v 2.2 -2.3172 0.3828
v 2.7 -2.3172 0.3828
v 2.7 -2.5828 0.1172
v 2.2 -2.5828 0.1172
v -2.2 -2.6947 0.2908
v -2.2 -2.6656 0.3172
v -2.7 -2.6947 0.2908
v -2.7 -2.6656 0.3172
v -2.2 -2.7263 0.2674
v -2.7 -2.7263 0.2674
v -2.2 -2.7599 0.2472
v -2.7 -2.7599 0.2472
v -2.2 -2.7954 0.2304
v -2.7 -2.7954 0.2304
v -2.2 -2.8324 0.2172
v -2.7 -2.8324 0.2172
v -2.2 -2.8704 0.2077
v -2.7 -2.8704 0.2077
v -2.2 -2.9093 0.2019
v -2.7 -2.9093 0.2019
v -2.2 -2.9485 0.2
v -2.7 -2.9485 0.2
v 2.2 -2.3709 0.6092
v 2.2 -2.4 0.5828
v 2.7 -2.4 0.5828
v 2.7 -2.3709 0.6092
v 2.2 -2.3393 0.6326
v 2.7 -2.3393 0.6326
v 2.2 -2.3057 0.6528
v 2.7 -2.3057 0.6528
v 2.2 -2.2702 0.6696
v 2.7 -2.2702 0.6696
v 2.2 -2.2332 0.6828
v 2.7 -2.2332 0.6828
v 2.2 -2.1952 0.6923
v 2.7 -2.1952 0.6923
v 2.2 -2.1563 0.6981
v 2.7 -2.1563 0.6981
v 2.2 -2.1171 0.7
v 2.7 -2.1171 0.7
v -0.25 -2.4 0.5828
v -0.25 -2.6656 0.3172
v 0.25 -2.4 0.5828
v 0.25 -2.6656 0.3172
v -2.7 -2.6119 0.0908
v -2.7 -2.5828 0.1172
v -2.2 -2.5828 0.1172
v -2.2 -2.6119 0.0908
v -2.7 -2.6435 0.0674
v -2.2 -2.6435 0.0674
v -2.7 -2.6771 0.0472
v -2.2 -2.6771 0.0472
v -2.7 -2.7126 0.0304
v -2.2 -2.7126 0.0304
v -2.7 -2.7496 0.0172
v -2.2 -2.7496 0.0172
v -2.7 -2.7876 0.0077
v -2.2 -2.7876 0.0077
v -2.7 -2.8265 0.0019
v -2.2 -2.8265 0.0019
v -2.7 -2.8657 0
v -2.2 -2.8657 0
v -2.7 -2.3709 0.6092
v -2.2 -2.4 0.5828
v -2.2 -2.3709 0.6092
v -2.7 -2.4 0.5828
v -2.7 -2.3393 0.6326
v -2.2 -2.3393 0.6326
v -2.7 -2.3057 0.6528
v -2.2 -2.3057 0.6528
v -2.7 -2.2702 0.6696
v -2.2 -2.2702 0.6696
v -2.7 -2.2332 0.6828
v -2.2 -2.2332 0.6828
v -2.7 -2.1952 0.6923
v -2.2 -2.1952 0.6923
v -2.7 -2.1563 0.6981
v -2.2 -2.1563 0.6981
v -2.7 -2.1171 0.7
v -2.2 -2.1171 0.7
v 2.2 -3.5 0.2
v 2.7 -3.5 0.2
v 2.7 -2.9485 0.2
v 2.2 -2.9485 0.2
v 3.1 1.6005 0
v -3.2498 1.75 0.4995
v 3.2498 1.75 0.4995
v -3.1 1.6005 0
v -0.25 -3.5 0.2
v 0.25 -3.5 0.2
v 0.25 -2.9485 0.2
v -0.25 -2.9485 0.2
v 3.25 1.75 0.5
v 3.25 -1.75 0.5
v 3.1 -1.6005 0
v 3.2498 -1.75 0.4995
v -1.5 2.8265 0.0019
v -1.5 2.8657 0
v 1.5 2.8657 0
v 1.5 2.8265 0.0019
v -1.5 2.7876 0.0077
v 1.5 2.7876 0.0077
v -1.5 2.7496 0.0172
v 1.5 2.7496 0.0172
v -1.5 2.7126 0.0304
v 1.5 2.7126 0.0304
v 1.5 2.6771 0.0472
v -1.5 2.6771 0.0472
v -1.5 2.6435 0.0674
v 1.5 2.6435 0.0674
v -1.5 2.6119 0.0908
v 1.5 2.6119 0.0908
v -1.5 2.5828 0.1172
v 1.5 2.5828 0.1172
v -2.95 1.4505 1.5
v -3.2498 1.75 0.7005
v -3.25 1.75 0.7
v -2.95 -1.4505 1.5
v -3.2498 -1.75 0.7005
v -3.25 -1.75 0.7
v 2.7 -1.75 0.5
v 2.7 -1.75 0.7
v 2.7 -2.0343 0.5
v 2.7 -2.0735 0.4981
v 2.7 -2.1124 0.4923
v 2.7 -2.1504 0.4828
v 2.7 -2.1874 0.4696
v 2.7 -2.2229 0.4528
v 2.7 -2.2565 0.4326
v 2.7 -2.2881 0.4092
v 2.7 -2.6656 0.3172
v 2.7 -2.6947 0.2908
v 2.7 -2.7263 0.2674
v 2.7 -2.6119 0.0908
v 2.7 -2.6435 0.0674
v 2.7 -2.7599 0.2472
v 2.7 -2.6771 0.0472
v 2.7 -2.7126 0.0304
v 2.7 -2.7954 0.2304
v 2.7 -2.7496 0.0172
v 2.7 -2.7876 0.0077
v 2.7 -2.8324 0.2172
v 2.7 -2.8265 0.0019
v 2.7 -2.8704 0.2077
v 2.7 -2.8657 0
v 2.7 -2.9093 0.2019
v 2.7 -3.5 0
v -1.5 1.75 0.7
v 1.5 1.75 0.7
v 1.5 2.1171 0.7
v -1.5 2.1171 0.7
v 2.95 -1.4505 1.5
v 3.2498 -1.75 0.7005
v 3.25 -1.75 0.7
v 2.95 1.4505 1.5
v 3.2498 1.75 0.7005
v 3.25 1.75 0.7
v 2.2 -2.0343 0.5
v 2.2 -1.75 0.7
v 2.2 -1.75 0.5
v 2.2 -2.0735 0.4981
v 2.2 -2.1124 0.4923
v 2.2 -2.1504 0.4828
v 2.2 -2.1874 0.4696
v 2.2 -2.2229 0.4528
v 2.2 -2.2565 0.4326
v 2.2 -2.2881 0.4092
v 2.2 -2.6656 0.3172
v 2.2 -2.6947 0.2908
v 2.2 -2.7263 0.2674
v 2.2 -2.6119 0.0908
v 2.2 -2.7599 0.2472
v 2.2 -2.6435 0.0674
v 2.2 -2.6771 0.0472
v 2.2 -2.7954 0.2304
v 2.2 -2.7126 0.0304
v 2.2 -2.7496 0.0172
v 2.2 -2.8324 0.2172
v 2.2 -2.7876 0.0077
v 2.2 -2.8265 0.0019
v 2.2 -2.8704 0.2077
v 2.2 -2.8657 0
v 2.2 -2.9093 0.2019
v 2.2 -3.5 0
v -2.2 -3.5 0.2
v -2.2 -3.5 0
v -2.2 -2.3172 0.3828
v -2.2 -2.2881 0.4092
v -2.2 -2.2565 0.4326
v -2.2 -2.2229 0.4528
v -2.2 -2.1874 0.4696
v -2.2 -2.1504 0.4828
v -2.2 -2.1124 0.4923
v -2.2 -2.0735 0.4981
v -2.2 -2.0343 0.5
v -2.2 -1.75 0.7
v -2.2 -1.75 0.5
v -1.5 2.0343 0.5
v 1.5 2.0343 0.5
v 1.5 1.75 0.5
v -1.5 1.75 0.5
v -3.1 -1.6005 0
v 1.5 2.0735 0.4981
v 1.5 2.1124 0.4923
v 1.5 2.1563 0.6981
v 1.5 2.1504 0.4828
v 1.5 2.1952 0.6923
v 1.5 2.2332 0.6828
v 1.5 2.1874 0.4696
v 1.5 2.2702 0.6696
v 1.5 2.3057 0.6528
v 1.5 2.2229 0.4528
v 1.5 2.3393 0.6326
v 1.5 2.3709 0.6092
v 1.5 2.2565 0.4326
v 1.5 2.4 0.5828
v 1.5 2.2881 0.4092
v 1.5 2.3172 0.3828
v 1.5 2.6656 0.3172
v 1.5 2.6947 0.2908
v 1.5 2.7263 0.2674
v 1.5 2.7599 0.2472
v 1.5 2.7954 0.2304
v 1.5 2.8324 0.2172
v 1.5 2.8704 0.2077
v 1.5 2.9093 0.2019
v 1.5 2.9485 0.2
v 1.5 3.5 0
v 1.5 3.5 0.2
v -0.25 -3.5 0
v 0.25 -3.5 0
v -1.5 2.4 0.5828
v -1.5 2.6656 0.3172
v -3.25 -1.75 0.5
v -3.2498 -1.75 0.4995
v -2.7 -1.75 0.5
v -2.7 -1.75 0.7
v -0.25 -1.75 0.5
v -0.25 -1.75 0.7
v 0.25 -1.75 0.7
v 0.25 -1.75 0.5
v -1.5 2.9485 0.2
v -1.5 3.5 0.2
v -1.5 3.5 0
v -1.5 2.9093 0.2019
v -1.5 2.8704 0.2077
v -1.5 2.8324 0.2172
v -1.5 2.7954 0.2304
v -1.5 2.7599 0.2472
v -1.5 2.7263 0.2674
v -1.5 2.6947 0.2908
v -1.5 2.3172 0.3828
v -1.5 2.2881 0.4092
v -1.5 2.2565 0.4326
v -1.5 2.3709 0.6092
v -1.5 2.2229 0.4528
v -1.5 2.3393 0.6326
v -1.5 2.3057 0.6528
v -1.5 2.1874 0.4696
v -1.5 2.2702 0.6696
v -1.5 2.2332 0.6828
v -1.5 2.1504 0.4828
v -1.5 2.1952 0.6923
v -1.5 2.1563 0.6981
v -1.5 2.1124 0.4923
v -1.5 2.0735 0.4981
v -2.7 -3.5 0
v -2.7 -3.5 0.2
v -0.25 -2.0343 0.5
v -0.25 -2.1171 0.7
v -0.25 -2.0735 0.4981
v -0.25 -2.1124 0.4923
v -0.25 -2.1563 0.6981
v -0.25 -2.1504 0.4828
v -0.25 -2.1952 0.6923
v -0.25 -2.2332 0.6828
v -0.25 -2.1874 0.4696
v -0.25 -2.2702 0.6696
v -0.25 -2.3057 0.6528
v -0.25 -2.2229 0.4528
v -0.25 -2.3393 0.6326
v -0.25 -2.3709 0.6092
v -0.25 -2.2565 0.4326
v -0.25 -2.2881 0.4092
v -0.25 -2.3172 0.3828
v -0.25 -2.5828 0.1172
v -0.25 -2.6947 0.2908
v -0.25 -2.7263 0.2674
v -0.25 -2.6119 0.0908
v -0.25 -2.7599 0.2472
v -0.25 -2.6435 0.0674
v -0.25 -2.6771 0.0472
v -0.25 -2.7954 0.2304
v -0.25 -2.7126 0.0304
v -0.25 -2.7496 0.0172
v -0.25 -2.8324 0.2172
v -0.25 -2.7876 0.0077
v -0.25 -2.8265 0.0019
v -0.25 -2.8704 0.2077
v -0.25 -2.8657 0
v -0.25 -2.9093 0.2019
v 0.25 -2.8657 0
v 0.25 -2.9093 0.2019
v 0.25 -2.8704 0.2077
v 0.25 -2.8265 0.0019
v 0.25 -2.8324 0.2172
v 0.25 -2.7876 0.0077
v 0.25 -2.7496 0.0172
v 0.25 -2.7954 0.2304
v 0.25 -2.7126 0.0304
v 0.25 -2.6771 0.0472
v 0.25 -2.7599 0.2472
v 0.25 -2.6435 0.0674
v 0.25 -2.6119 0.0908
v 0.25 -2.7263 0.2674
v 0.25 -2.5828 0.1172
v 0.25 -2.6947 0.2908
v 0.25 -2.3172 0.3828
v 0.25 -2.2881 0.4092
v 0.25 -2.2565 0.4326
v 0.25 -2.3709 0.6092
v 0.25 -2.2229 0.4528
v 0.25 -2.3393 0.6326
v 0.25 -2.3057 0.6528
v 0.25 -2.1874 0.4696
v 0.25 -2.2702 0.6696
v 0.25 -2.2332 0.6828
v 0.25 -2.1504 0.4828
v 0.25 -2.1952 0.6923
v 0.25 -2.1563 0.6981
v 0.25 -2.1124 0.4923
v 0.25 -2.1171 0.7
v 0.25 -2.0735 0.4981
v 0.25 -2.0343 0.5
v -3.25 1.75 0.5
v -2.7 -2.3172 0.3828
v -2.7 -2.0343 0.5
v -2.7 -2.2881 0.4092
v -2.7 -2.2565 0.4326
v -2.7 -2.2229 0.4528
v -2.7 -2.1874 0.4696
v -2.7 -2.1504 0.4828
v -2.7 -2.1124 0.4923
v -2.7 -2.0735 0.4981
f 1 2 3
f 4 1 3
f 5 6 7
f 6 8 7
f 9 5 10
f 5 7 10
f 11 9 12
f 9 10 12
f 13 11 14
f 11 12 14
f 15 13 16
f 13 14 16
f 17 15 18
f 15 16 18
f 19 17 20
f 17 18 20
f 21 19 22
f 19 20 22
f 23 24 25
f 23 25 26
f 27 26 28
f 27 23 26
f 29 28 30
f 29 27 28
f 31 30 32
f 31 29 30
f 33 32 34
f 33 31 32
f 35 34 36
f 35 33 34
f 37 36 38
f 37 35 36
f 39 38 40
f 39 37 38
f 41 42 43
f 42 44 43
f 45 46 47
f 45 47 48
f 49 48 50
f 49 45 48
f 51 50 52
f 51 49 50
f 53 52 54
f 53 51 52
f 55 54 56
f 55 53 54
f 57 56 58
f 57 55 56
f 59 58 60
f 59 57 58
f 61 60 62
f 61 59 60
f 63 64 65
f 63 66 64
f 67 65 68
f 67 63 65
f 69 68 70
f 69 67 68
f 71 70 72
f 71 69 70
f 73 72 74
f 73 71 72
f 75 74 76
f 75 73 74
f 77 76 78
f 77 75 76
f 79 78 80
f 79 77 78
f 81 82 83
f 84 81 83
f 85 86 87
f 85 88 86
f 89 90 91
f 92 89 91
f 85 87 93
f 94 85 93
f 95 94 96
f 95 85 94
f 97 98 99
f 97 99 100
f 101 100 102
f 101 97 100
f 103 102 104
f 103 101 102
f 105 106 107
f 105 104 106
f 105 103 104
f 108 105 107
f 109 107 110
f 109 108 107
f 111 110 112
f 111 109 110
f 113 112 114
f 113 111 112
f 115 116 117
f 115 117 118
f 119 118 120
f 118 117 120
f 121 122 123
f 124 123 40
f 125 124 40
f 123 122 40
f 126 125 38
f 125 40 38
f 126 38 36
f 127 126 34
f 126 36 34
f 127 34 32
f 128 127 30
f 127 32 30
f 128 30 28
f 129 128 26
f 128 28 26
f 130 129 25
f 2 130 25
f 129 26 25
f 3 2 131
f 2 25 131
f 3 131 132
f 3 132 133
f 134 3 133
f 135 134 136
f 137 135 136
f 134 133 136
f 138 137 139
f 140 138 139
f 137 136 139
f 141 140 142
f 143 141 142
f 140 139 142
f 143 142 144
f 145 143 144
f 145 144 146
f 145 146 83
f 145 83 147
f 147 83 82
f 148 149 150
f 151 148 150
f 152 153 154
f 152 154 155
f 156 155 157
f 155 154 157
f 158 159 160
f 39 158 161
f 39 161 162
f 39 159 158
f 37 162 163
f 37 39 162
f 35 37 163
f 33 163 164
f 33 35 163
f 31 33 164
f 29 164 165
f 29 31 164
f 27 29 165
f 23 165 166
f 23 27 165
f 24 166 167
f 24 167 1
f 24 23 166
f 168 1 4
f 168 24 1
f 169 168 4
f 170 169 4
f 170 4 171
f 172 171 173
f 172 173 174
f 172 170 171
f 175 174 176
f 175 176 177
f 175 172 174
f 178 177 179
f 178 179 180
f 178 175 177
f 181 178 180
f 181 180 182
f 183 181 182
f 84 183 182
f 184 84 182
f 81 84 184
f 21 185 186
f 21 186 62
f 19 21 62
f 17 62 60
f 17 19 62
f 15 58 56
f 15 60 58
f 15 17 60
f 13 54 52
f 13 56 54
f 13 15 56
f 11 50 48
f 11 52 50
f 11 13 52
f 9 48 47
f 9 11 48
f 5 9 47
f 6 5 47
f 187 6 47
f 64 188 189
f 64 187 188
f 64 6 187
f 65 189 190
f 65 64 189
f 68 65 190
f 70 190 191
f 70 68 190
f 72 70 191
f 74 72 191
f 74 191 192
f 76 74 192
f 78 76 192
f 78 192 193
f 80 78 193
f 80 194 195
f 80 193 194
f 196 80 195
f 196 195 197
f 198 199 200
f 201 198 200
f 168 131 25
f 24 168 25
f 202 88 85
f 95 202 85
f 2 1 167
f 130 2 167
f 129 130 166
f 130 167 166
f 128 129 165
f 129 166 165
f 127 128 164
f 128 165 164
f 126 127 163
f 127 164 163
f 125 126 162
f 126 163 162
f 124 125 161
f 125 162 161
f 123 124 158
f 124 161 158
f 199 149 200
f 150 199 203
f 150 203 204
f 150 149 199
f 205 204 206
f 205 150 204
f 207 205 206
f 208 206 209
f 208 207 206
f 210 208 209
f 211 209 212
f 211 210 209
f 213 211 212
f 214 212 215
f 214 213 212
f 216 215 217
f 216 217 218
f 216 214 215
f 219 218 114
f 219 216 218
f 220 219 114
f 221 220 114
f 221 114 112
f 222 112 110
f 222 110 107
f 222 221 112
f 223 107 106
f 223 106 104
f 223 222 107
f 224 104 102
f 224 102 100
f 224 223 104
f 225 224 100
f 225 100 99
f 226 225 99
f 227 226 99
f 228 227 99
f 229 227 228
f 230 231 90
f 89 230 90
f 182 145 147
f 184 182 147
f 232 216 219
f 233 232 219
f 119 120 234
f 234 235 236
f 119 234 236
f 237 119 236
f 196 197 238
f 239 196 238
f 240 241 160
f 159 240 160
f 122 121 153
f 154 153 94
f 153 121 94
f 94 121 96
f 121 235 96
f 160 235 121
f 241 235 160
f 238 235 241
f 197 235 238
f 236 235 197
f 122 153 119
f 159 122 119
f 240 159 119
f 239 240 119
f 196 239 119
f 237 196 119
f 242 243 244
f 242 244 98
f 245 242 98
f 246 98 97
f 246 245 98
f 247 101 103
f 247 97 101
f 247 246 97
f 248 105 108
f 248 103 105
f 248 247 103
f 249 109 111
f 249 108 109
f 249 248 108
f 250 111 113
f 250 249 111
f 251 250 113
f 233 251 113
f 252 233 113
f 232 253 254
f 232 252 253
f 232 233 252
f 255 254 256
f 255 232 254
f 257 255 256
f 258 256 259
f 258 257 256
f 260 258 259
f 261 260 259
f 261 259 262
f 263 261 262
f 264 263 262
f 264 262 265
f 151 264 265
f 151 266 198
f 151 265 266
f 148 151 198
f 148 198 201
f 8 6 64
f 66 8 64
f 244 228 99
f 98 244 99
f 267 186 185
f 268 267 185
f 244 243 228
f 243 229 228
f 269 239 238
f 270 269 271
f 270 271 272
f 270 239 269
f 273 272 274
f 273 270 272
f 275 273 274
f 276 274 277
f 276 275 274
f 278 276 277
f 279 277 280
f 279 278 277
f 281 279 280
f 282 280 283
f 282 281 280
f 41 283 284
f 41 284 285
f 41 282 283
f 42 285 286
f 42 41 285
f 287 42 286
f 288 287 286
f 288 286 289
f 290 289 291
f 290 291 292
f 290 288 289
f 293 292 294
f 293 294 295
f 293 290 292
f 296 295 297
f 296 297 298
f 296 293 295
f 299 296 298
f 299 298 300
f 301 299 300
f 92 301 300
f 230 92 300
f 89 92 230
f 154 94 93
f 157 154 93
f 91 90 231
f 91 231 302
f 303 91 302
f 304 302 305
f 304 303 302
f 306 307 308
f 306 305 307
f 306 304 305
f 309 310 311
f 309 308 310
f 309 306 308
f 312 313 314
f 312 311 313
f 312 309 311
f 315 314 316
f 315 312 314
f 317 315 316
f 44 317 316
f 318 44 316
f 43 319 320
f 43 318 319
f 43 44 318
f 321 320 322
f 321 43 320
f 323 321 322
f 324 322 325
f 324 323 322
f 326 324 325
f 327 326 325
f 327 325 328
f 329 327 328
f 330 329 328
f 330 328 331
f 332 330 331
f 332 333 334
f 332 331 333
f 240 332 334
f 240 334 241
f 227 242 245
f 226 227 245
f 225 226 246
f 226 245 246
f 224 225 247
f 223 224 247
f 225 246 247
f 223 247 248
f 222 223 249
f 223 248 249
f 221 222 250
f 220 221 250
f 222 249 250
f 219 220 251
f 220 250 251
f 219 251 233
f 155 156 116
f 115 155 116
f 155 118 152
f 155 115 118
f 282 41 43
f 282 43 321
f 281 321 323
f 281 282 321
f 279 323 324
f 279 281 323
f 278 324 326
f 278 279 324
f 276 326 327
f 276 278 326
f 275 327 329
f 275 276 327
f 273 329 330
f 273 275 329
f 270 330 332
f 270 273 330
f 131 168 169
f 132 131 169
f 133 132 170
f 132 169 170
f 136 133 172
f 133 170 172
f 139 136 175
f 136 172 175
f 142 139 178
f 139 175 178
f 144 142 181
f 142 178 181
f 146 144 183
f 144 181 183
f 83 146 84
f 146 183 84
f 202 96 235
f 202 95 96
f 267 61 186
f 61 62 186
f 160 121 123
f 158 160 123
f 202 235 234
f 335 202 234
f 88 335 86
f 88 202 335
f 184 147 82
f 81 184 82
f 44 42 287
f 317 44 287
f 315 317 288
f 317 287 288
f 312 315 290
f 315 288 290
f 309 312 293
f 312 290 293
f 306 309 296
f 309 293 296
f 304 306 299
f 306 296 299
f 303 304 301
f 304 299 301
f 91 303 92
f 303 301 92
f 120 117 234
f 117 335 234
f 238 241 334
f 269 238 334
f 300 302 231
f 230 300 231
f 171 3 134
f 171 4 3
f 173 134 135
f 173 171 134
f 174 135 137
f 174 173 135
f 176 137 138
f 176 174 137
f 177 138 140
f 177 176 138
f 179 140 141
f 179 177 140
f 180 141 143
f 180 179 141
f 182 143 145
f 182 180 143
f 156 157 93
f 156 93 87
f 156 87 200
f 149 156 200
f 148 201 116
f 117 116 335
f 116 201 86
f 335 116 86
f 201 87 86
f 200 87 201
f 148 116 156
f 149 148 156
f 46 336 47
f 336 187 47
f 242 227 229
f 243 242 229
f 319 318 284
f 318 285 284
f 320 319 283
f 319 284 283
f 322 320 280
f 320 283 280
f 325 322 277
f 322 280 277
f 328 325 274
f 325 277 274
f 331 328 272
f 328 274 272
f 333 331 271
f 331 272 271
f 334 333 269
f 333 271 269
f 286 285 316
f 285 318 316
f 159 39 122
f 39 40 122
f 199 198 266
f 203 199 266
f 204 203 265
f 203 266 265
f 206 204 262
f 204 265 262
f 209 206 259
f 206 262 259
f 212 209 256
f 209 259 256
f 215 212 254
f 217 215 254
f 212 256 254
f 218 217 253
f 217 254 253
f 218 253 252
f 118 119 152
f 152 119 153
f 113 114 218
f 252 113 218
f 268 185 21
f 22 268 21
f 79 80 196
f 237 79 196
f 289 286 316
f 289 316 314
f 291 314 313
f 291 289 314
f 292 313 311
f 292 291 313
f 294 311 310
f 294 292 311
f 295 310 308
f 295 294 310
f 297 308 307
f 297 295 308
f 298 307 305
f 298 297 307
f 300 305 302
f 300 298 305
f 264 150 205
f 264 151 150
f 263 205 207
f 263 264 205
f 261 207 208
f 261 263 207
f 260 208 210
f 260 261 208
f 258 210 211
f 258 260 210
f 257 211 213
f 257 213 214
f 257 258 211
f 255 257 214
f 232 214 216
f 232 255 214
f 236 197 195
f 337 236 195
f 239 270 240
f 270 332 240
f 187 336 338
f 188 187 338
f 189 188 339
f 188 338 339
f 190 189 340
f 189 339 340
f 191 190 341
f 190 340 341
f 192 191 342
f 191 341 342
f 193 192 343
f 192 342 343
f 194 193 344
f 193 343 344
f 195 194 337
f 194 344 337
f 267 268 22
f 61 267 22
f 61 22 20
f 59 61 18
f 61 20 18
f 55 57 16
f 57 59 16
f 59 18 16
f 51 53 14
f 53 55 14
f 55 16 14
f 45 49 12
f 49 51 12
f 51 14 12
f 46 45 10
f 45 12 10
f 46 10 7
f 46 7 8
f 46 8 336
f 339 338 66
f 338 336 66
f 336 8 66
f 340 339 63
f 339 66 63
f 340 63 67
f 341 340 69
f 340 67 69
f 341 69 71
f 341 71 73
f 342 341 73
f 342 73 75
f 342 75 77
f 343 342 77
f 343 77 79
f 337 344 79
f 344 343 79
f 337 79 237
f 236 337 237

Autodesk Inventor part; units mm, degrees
ref_plane "YZ Plane" through (0, 0, 0) normal (1, 0, 0) x (0, 1, 0)
ref_plane "XZ Plane" through (0, 0, 0) normal (0, 1, 0) x (-1, 0, 0)
ref_plane "XY Plane" through (0, 0, 0) normal (0, 0, 1) x (1, 0, 0)
sketch "Skizze1" plane through (0, 0, 0) normal (0, 0, 1) x (1, 0, 0)
  line L0 (-3.25, -1.75) -> (3.25, -1.75)
  line L1 (3.25, -1.75) -> (3.25, 1.75)
  line L2 (3.25, 1.75) -> (-3.25, 1.75)
  line L3 (-3.25, 1.75) -> (-3.25, -1.75)
  line L4 (-3.25, -1.75) -> (3.25, 1.75) construction
  line L5 (3.25, -1.75) -> (-3.25, 1.75) construction
  point P0 (0, 0)
  dimension "d0" = 6.5
  dimension "d1" = 3.5
extrude "Extrusion1" add sketch "Skizze1" along normal blind 1.5
sketch "Skizze2" plane through (3.25, -1.75, 0) normal (1, 0, 0) x (0, 0, -1)
  line L0 (0, 3.5) -> (-1.5, 3.5) projected
  line L1 (-0.7, 3.5) -> (-0.7, 4.0328)
  line L2 (-0.7, 4.0328) -> (-0.2, 4.5328)
  line L3 (-0.2, 4.5328) -> (-0.2, 5.25)
  line L4 (-0.2, 5.25) -> (0, 5.25)
  line L5 (0, 5.25) -> (0, 4.45)
  line L6 (0, 4.45) -> (-0.5, 3.95)
  line L7 (-0.5, 3.95) -> (-0.5, 3.5)
  line L8 (0, 0) -> (0, 3.5) projected
  point P0 (0, 1.75)
  dimension "d4" = 0.8
  dimension "d5" = 0.7
  dimension "d6" = 0.2
  dimension "d7" = 0.2
  dimension "d8" = 0.2
  dimension "d9" = 1.75
  dimension "d10" = 45
extrude "Extrusion2" add sketch "Skizze2" against normal blind 6.5
mirror "Spiegeln1" about plane through (0, 0, 0) normal (0, 1, 0) of "Extrusion2"
sketch "Skizze3" plane through (0, 0, 1.5) normal (0, 0, 1) x (1, 0, 0)
  line L0 (-3.25, 3.5) -> (-1.5, 3.5)
  line L1 (-1.5, 3.5) -> (-1.5, 1.75)
  line L2 (-1.5, 1.75) -> (-3.25, 1.75)
  line L3 (-3.25, 1.75) -> (-3.25, 3.5)
  line L4 (1.5, 3.5) -> (3.25, 3.5)
  line L5 (3.25, 3.5) -> (3.25, 1.75)
  line L6 (3.25, 1.75) -> (1.5, 1.75)
  line L7 (1.5, 1.75) -> (1.5, 3.5)
  line L8 (-3.25, -3.5) -> (-2.7, -3.5)
  line L9 (-2.7, -3.5) -> (-2.7, -1.75)
  line L10 (-2.7, -1.75) -> (-3.25, -1.75)
  line L11 (-3.25, -1.75) -> (-3.25, -3.5)
  line L12 (-0.25, -3.5) -> (-2.2, -3.5)
  line L13 (-2.2, -3.5) -> (-2.2, -1.75)
  line L14 (-2.2, -1.75) -> (-0.25, -1.75)
  line L15 (-0.25, -1.75) -> (-0.25, -3.5)
  line L16 (0.25, -1.75) -> (2.2, -1.75)
  line L17 (2.2, -1.75) -> (2.2, -3.5)
  line L18 (2.2, -3.5) -> (0.25, -3.5)
  line L19 (0.25, -3.5) -> (0.25, -1.75)
  line L20 (2.7, -3.5) -> (3.25, -3.5)
  line L21 (3.25, -3.5) -> (3.25, -1.75)
  line L22 (3.25, -1.75) -> (2.7, -1.75)
  line L23 (2.7, -1.75) -> (2.7, -3.5)
  line L24 (-3.25, -1.75) -> (3.25, -1.75) projected
  line L25 (3.25, 3.5) -> (-3.25, 3.5) projected
  line L26 (3.25, 1.75) -> (-3.25, 1.75) projected
  line L27 (3.25, 3.5) -> (3.25, 2.7828) projected
  line L28 (-3.25, 2.7828) -> (-3.25, 3.5) projected
  line L29 (0, 5.1518) -> (0, -6.0635) construction
  line L30 (3.25, -2.2828) -> (3.25, -1.75) construction
  line L31 (3.25, -3.5) -> (-3.25, -3.5) construction
  point P0 (0, 0)
  dimension "d13" = 3
  dimension "d14" = 0.5
  dimension "d15" = 5.4
  dimension "d16" = 0.5
extrude "Extrusion3" cut sketch "Skizze3" against normal blind 6.5 contours L0 L1 L2 L3 | L4 L5 L6 L7 | L11 L10 L9 L8 | L22 L21 L20 L23 | L16 L17 L18 L19 | L14 L15 L12 L13
chamfer "Fase1" distance 0.3 distance2 0.8 1 edges at (0, 1.75, 1.5) measured on face at (1.0833, -0.5833, 1.5)
chamfer "Fase2" distance 0.3 distance2 0.8 1 edges at (0, -1.75, 1.5) measured on face at (-1.0833, 0.3837, 1.5)
chamfer "Fase3" distance 0.5 distance2 0.15 1 edges at (0, 1.75, 0) measured on face at (0.5, 1.75, 0.1667)
chamfer "Fase4" distance 0.5 distance2 0.15 1 edges at (0, -1.75, 0) measured on face at (-0.0833, -1.75, 0.1667)
fillet "Rundung1" radius 0.4 16 edges at (2.45, -2.2828, 0.7) (2.45, -2.2, 0.5) (2.45, -2.7, 0) (2.45, -2.7828, 0.2) (0, -2.2, 0.5) (0, -2.7, 0) (0, -2.2828, 0.7) (0, -2.7828, 0.2) (-2.45, -2.2828, 0.7) (-2.45, -2.2, 0.5) (-2.45, -2.7, 0) (-2.45, -2.7828, 0.2) (0, 2.7, 0) (0, 2.7828, 0.2) (0, 2.2, 0.5) (0, 2.2828, 0.7)
chamfer "Fase5" distance 0.5 distance2 0.15 1 edges at (-3.25, 0, 0) measured on face at (-3.25, 0.4835, 0.5)
chamfer "Fase6" distance 0.5 distance2 0.15 1 edges at (3.25, 0, 0) measured on face at (3.25, -0.4835, 0.5)
chamfer "Fase7" distance 0.3 distance2 0.8 1 edges at (3.25, 0, 1.5) measured on face at (-1.0833, 0.4835, 1.5)
chamfer "Fase8" distance 0.3 distance2 0.8 1 edges at (-3.25, 0, 1.5) measured on face at (0.8833, -0.4835, 1.5)
equation "\"d8\" = d7"
properties part number "AMS1117"
